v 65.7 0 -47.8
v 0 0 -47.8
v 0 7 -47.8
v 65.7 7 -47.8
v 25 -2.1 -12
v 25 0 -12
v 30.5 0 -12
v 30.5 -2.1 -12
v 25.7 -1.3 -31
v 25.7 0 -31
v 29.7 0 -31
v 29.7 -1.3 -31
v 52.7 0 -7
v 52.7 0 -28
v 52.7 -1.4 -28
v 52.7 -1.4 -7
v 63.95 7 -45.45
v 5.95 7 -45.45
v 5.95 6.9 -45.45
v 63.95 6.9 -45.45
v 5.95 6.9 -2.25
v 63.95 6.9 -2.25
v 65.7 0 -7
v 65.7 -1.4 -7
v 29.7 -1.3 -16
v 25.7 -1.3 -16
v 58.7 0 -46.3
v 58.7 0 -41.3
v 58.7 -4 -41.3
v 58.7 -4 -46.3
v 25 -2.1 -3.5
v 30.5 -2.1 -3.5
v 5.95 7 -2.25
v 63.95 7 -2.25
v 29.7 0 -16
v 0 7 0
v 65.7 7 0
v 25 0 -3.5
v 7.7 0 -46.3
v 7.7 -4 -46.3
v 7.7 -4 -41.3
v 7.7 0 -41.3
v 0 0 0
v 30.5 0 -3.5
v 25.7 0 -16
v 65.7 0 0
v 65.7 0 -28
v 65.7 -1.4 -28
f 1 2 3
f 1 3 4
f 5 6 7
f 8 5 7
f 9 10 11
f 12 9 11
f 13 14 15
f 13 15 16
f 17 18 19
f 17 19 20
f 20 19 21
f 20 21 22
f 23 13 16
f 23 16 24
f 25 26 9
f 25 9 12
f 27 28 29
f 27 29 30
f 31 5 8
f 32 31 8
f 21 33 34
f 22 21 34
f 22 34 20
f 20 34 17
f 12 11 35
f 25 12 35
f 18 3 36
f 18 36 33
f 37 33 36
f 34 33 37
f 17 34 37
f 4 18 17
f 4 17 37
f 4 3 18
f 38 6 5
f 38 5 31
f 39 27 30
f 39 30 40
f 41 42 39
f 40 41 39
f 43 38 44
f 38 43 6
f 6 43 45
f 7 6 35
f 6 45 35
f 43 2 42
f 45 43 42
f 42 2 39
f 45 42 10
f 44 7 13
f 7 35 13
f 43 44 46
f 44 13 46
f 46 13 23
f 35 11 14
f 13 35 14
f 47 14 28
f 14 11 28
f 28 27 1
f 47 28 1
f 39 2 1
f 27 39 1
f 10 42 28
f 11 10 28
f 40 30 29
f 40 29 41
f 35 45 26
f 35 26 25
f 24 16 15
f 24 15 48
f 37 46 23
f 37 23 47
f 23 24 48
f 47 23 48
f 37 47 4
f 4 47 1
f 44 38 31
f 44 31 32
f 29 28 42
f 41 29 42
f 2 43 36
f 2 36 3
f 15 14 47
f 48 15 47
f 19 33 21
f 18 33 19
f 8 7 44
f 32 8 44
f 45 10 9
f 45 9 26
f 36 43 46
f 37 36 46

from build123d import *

# Parameters (mm, degrees)
SKETCH1_W           = 65.7
SKETCH1_H           = 47.8
BOSS_EXTRUDE1_DEPTH = 7
SKETCH2_W           = 58
SKETCH2_H           = 43.2
CUT_EXTRUDE1_DEPTH  = 0.1
SKETCH3_W           = 13
SKETCH3_H           = 21
BOSS_EXTRUDE2_DEPTH = 1.4
SKETCH4_W           = 5.5
SKETCH4_H           = 8.5
BOSS_EXTRUDE3_DEPTH = 2.1
SKETCH5_W           = 4
SKETCH5_H           = 15
BOSS_EXTRUDE4_DEPTH = 1.3
SKETCH6_W           = 51
SKETCH6_H           = 5
BOSS_EXTRUDE5_DEPTH = 4


with BuildPart() as part:
    # Sketch1 → Boss-Extrude1 (new body)
    with BuildSketch(Plane(origin=(0, 0, 0), x_dir=(1, 0, 0), z_dir=(0, 1, 0))):
        with Locations((32.85, 23.9)):
            Rectangle(SKETCH1_W, SKETCH1_H)
    extrude(amount=BOSS_EXTRUDE1_DEPTH)

    # Sketch2 → Cut-Extrude1 (cut)
    with BuildSketch(Plane(origin=(0, 7, 0), x_dir=(1, 0, 0), z_dir=(0, 1, 0))):
        with Locations((34.95, 23.85)):
            Rectangle(SKETCH2_W, SKETCH2_H)
    extrude(amount=-CUT_EXTRUDE1_DEPTH, mode=Mode.SUBTRACT)

    # Sketch3 → Boss-Extrude2 (add)
    with BuildSketch(Plane.XZ):
        with Locations((59.2, -17.5)):
            Rectangle(SKETCH3_W, SKETCH3_H)
    extrude(amount=BOSS_EXTRUDE2_DEPTH)

    # Sketch4 → Boss-Extrude3 (add)
    with BuildSketch(Plane.XZ):
        with Locations((27.75, -7.75)):
            Rectangle(SKETCH4_W, SKETCH4_H)
    extrude(amount=BOSS_EXTRUDE3_DEPTH)

    # Sketch5 → Boss-Extrude4 (add)
    with BuildSketch(Plane.XZ):
        with Locations((27.7, -23.5)):
            Rectangle(SKETCH5_W, SKETCH5_H)
    extrude(amount=BOSS_EXTRUDE4_DEPTH)

    # Sketch6 → Boss-Extrude5 (add)
    with BuildSketch(Plane(origin=(0, 0, 0), x_dir=(-1, 0, 0), z_dir=(0, -1, 0))):
        with Locations((-33.2, 43.8)):
            Rectangle(SKETCH6_W, SKETCH6_H)
    extrude(amount=BOSS_EXTRUDE5_DEPTH)


solid = part.part
